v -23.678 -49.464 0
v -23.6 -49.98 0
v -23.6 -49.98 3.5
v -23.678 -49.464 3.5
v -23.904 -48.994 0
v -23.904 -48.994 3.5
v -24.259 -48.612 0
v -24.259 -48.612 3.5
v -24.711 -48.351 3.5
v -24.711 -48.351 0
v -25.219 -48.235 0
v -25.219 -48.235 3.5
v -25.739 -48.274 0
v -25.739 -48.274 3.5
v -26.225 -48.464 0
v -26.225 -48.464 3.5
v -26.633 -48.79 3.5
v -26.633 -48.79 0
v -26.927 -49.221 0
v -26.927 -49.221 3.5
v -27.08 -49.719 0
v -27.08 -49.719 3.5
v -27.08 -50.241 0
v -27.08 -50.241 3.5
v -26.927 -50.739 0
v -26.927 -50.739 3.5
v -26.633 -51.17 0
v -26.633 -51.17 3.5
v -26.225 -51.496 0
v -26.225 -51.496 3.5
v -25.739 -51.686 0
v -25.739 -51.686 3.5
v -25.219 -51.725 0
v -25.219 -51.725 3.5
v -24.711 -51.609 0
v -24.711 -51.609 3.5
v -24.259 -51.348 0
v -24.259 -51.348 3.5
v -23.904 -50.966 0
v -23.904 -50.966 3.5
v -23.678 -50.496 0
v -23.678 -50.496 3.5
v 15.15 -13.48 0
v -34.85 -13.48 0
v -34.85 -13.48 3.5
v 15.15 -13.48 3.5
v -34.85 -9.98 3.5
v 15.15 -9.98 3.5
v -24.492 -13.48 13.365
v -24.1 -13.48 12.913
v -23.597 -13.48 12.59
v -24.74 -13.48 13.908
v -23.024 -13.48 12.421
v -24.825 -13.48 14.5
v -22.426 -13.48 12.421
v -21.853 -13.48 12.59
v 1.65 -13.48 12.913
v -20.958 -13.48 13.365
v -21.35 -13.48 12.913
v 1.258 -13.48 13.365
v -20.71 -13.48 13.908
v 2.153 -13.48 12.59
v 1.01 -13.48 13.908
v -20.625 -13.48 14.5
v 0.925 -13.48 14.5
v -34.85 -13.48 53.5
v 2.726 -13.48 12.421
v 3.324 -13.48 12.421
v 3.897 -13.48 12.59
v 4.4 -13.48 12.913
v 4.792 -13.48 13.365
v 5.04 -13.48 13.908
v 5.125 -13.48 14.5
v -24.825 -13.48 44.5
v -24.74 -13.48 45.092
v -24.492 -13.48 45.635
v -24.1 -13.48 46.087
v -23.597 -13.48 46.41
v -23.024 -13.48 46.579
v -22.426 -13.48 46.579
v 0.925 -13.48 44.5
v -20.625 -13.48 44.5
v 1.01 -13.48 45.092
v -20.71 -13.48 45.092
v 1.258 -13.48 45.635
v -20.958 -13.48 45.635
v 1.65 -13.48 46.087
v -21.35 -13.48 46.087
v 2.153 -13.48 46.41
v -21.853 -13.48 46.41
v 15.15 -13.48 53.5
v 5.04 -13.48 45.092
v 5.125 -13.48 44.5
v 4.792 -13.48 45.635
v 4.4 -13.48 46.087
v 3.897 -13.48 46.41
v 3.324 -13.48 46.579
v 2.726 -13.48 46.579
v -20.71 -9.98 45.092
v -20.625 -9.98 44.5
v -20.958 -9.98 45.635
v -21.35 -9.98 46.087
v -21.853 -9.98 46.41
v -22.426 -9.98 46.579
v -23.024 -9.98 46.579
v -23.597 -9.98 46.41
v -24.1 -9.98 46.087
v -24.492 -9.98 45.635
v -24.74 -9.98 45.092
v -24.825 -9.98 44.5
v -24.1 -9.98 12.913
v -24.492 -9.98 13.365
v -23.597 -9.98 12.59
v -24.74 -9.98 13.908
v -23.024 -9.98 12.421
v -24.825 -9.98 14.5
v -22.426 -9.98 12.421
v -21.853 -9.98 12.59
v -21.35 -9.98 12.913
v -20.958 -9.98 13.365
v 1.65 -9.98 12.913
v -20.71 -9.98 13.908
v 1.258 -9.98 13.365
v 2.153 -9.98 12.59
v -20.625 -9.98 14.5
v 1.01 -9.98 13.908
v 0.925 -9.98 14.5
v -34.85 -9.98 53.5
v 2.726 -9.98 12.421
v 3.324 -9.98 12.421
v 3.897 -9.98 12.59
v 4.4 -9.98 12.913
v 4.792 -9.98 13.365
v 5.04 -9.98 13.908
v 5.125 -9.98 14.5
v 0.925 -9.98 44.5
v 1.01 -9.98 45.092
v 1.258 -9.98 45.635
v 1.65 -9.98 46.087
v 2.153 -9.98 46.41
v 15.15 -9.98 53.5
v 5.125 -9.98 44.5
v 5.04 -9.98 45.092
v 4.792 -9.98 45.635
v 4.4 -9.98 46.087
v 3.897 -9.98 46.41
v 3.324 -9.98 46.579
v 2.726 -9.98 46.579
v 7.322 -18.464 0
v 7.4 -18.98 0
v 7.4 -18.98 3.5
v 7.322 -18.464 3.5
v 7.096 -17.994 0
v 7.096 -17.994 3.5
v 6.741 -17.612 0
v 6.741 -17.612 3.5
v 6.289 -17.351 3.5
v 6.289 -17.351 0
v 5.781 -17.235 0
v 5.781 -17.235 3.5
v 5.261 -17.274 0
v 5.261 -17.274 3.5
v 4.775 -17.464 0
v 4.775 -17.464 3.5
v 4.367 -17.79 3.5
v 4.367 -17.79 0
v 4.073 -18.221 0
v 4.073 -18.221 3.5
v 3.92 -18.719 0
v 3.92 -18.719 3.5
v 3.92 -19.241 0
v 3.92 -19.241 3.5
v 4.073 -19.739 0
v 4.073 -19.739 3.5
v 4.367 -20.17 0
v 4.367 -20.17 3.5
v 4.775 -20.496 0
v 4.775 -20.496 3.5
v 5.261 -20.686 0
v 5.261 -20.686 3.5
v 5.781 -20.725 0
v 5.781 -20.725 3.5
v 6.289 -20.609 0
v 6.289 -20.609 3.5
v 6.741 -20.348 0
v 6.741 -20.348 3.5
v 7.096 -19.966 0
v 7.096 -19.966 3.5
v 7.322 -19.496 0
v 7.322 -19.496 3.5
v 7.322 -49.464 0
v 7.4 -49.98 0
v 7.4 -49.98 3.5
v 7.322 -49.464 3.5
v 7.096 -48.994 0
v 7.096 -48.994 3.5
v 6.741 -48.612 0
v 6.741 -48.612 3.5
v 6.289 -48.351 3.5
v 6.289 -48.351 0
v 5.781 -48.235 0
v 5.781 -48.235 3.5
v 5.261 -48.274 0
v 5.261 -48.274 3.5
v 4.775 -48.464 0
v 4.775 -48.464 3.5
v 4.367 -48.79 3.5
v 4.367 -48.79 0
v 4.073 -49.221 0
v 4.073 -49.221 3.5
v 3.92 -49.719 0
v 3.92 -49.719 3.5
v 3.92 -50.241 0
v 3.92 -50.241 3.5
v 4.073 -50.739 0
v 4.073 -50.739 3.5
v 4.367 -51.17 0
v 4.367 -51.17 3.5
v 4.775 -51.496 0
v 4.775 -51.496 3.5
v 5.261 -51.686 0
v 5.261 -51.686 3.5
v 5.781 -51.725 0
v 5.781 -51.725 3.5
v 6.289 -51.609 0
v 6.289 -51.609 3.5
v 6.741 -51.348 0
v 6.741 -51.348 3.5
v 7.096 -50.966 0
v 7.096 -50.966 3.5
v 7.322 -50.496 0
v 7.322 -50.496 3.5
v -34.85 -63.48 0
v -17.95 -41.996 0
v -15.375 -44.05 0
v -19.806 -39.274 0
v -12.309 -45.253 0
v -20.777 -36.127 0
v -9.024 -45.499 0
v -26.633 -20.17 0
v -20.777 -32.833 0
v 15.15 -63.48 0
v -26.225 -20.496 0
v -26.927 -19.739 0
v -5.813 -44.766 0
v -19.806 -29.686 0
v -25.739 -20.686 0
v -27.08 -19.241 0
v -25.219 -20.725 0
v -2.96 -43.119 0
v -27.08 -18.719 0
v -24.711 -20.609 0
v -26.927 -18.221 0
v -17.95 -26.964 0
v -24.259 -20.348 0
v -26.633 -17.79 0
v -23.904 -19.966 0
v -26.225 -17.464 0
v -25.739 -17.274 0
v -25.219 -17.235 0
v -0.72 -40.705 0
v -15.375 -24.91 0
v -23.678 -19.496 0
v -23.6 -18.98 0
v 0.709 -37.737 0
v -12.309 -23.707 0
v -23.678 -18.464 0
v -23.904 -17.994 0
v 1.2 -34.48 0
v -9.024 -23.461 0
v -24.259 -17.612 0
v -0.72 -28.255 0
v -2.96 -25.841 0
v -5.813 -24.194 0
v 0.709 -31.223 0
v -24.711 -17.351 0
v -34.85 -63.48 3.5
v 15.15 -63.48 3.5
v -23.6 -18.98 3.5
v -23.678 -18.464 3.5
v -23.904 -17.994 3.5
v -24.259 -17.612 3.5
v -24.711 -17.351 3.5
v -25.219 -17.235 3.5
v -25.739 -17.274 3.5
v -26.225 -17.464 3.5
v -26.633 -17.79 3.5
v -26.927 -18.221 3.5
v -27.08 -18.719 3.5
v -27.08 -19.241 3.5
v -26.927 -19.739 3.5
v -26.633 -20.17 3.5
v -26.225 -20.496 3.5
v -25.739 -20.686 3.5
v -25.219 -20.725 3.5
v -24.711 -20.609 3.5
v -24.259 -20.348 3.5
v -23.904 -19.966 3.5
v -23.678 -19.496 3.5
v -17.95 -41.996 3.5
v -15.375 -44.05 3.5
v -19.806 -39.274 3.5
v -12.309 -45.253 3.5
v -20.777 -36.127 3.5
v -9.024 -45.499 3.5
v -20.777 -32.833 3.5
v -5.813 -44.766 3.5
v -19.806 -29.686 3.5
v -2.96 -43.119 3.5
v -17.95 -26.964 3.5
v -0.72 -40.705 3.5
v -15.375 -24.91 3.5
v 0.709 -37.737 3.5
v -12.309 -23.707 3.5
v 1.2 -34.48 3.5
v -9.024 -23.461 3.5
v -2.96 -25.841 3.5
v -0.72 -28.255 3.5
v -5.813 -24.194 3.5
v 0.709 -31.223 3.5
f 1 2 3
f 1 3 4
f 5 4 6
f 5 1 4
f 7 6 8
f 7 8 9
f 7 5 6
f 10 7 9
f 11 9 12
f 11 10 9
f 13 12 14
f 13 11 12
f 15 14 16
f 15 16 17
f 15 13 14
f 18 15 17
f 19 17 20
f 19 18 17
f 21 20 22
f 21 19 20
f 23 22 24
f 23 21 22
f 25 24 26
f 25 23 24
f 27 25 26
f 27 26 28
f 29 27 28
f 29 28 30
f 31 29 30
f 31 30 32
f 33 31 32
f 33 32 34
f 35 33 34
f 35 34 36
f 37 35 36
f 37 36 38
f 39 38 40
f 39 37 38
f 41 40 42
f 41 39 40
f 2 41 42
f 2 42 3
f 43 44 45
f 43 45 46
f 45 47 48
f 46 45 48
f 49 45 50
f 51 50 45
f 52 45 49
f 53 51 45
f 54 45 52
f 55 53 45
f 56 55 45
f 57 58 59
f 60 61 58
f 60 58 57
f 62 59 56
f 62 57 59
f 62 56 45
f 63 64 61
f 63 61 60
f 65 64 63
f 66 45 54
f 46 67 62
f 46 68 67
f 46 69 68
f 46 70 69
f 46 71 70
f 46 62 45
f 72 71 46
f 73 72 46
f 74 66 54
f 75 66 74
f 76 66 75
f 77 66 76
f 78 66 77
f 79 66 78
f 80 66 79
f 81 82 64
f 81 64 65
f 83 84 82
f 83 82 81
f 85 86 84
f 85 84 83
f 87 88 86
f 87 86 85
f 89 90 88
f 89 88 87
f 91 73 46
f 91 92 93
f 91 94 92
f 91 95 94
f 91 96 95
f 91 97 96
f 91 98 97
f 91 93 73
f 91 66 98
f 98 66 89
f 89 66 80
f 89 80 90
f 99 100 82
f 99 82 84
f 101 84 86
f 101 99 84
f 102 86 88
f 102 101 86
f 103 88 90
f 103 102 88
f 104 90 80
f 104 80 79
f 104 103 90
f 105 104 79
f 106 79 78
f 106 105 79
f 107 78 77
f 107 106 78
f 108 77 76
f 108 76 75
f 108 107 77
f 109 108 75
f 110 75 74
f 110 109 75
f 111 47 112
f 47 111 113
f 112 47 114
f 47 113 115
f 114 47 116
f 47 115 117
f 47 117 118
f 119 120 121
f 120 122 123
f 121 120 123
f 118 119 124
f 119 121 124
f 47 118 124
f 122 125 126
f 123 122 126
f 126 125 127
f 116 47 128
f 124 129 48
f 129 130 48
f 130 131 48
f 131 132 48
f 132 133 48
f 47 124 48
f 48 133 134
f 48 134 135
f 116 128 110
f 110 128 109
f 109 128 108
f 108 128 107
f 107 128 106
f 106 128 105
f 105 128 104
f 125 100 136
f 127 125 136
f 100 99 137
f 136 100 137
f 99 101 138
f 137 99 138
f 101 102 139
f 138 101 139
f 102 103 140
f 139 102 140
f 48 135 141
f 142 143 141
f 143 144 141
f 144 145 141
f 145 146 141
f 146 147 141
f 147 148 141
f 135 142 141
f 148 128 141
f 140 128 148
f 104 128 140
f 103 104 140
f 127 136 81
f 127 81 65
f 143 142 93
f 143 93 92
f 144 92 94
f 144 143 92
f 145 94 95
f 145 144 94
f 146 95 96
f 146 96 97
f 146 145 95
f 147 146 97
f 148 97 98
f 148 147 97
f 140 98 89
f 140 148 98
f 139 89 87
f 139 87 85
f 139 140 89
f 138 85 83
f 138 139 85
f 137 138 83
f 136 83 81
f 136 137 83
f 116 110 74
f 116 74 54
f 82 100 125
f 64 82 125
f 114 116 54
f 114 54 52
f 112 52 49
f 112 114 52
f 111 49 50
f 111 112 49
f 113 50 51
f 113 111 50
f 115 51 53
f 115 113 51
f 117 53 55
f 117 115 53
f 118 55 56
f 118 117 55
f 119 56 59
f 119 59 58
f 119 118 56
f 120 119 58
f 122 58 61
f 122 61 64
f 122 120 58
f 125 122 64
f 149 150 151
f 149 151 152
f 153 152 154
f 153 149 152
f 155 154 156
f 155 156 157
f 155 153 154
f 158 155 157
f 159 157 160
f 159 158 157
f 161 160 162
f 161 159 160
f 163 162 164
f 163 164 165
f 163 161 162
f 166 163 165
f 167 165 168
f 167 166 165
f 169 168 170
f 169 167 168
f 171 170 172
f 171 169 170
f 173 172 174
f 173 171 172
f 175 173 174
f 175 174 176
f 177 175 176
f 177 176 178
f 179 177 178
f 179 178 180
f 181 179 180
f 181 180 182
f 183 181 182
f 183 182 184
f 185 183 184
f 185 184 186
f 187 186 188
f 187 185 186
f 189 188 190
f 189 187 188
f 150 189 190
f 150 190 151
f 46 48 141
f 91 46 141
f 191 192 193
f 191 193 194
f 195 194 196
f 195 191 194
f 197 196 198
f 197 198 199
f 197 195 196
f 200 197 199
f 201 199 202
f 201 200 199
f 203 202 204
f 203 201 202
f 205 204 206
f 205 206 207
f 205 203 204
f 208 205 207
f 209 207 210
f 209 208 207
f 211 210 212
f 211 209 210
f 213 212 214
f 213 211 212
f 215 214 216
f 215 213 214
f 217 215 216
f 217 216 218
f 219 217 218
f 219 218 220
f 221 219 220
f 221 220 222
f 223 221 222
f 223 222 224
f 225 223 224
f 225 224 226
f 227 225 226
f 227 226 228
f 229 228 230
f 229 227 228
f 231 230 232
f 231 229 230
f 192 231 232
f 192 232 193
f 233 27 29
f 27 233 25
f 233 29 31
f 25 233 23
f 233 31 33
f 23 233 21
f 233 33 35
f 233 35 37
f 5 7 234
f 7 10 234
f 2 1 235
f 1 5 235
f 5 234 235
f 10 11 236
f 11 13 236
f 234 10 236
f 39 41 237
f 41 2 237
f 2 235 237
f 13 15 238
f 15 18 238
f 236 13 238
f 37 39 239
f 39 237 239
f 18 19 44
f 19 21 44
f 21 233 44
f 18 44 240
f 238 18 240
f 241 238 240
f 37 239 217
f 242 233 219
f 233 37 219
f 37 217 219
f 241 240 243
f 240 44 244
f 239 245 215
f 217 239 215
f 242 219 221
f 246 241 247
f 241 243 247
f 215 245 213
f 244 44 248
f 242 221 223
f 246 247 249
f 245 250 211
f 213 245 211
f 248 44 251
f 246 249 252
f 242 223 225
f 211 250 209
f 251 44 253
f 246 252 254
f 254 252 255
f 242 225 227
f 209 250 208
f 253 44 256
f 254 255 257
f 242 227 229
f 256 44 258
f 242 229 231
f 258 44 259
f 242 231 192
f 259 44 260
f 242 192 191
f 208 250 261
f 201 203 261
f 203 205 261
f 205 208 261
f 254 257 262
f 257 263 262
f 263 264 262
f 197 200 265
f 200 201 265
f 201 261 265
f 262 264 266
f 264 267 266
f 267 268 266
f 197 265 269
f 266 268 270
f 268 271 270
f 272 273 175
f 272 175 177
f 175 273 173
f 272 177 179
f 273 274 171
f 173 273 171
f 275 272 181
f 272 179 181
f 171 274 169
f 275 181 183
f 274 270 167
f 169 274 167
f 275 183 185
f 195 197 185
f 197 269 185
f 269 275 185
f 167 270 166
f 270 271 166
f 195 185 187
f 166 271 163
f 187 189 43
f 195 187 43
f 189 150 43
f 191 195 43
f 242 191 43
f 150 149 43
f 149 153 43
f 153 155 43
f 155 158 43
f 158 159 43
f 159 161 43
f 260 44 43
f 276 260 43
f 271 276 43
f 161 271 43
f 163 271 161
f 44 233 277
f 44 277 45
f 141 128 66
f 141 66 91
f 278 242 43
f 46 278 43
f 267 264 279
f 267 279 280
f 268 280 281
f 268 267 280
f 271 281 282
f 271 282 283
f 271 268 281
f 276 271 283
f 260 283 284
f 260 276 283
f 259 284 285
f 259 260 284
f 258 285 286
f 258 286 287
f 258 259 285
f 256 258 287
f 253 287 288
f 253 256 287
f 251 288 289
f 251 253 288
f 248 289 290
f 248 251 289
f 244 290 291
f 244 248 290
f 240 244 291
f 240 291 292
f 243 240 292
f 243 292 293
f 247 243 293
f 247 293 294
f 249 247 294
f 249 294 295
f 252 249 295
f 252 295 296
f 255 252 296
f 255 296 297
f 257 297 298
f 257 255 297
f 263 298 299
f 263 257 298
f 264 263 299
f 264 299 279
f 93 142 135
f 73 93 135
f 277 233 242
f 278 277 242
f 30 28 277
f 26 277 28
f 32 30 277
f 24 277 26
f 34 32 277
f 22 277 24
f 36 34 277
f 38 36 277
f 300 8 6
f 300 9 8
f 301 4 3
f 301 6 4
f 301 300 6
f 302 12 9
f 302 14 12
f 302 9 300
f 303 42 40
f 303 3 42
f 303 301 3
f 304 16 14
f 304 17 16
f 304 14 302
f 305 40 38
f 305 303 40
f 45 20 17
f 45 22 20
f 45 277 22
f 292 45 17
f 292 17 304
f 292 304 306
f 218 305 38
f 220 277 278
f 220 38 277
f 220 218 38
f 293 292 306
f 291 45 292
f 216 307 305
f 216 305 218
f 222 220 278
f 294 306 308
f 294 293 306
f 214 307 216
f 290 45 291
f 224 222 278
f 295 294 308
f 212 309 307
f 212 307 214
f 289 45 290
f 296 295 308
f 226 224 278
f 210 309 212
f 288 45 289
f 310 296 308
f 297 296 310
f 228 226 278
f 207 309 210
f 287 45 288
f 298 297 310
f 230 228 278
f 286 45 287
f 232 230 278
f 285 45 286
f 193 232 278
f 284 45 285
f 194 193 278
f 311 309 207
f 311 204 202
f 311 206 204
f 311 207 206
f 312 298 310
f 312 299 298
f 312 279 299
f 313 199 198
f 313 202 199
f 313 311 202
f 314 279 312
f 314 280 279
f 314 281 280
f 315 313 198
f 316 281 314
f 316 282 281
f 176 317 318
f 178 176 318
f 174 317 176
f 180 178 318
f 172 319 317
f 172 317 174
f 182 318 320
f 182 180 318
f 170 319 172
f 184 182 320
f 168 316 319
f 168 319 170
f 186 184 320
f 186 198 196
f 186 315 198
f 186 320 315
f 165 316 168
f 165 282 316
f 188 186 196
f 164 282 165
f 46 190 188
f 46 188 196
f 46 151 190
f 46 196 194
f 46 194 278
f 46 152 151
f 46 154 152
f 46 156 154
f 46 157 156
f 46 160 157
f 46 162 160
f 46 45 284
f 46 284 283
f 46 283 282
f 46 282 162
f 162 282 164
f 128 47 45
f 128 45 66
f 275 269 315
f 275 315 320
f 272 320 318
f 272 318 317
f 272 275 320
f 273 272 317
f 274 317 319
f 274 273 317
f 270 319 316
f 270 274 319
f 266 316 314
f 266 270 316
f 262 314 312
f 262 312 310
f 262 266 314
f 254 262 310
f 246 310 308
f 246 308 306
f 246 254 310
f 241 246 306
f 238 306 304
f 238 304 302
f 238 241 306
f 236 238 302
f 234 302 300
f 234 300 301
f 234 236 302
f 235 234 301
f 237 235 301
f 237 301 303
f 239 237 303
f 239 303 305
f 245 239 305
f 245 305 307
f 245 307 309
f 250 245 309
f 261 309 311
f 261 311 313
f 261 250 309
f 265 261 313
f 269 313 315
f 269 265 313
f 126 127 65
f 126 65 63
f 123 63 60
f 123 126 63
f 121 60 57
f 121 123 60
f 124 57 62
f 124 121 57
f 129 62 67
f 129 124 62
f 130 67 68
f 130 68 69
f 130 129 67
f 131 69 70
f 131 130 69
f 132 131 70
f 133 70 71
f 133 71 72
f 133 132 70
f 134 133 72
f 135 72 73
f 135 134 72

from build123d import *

# Parameters (mm, degrees)
SKETCH003_W      = 50
SKETCH003_H      = 50
EXTRUDE003_DEPTH = 3.5
SKETCH002_W      = 50
SKETCH002_H      = 50
SKETCH002_R      = 11.05
SKETCH002_R_2    = 1.75
EXTRUDE002_DEPTH = 3.5


with BuildPart() as mountplate:
    # Sketch003 → Extrude003 (new body)
    with BuildSketch(Plane(origin=(0, 28.5, 28.5), x_dir=(1, 0, 0), z_dir=(0, -1, 0))):
        Rectangle(SKETCH003_W, SKETCH003_H)
        with BuildLine():
            ThreePointArc((-10.775, 16.00001), (-12.875, 18.10001), (-14.975, 16.00001))
            Line((-14.975, 16.00001), (-14.975, -13.99999))
            ThreePointArc((-14.975, -13.99999), (-12.875, -16.09999), (-10.775, -13.99999))
            Line((-10.775, 16.00001), (-10.775, -13.99999))
        make_face(mode=Mode.SUBTRACT)
        with BuildLine():
            ThreePointArc((14.975, 16.00001), (12.875, 18.100017), (10.775, 16.00001))
            Line((10.775, 16.00001), (10.775, -13.99999))
            ThreePointArc((10.775, -13.99999), (12.875, -16.1), (14.975, -13.99999))
            Line((14.975, 16.00001), (14.975, -13.99999))
        make_face(mode=Mode.SUBTRACT)
    extrude(amount=EXTRUDE003_DEPTH)


with BuildPart() as nema17rightangle:
    # Sketch002 → Extrude002 (new body)
    with BuildSketch(Plane.XY):
        Rectangle(SKETCH002_W, SKETCH002_H)
        with Locations((0, 4)):
            Circle(SKETCH002_R, mode=Mode.SUBTRACT)
        with Locations((-15.5, 19.5)):
            Circle(SKETCH002_R_2, mode=Mode.SUBTRACT)
        with Locations((-15.5, -11.5)):
            Circle(SKETCH002_R_2, mode=Mode.SUBTRACT)
        with Locations((15.5, 19.5)):
            Circle(SKETCH002_R_2, mode=Mode.SUBTRACT)
        with Locations((15.5, -11.5)):
            Circle(SKETCH002_R_2, mode=Mode.SUBTRACT)
    extrude(amount=EXTRUDE002_DEPTH)

    # Fusion: union MountPlate
    add(mountplate.part)


with BuildPart() as nema17rightangle_1:
    # Fusion placement: moved
    add(nema17rightangle.part.moved(Location((-9.85, -38.48, 0))))


solid = nema17rightangle_1.part
